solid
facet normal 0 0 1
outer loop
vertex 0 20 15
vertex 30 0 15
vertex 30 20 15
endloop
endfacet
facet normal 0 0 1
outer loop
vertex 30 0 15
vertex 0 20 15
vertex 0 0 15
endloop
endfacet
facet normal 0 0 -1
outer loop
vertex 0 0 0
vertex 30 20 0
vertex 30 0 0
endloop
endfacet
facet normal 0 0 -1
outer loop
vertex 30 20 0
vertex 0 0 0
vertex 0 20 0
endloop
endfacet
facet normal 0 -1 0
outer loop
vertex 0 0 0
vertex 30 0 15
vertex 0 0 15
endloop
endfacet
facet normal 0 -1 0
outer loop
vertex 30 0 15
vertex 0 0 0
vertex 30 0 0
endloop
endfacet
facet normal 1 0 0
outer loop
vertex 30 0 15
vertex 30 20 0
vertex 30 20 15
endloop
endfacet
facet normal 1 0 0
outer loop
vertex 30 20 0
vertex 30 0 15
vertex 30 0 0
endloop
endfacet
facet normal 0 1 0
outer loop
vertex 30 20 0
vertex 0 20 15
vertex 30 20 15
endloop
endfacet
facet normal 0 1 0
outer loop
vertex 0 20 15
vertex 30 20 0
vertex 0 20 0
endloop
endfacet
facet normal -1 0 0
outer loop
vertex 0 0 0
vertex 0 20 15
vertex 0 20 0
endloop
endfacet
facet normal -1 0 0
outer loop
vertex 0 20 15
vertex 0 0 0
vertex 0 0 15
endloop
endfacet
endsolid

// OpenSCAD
// ── Parâmetros principais ──────────────────────────────────
width  = 30;       // [2:150]   Largura da peça (mm)
height = 20;       // [2:150]   Altura da peça (mm)
depth  = 15;       // [2:150]   Profundidade (mm)
// ============================================================
cube([width,height,depth]);
